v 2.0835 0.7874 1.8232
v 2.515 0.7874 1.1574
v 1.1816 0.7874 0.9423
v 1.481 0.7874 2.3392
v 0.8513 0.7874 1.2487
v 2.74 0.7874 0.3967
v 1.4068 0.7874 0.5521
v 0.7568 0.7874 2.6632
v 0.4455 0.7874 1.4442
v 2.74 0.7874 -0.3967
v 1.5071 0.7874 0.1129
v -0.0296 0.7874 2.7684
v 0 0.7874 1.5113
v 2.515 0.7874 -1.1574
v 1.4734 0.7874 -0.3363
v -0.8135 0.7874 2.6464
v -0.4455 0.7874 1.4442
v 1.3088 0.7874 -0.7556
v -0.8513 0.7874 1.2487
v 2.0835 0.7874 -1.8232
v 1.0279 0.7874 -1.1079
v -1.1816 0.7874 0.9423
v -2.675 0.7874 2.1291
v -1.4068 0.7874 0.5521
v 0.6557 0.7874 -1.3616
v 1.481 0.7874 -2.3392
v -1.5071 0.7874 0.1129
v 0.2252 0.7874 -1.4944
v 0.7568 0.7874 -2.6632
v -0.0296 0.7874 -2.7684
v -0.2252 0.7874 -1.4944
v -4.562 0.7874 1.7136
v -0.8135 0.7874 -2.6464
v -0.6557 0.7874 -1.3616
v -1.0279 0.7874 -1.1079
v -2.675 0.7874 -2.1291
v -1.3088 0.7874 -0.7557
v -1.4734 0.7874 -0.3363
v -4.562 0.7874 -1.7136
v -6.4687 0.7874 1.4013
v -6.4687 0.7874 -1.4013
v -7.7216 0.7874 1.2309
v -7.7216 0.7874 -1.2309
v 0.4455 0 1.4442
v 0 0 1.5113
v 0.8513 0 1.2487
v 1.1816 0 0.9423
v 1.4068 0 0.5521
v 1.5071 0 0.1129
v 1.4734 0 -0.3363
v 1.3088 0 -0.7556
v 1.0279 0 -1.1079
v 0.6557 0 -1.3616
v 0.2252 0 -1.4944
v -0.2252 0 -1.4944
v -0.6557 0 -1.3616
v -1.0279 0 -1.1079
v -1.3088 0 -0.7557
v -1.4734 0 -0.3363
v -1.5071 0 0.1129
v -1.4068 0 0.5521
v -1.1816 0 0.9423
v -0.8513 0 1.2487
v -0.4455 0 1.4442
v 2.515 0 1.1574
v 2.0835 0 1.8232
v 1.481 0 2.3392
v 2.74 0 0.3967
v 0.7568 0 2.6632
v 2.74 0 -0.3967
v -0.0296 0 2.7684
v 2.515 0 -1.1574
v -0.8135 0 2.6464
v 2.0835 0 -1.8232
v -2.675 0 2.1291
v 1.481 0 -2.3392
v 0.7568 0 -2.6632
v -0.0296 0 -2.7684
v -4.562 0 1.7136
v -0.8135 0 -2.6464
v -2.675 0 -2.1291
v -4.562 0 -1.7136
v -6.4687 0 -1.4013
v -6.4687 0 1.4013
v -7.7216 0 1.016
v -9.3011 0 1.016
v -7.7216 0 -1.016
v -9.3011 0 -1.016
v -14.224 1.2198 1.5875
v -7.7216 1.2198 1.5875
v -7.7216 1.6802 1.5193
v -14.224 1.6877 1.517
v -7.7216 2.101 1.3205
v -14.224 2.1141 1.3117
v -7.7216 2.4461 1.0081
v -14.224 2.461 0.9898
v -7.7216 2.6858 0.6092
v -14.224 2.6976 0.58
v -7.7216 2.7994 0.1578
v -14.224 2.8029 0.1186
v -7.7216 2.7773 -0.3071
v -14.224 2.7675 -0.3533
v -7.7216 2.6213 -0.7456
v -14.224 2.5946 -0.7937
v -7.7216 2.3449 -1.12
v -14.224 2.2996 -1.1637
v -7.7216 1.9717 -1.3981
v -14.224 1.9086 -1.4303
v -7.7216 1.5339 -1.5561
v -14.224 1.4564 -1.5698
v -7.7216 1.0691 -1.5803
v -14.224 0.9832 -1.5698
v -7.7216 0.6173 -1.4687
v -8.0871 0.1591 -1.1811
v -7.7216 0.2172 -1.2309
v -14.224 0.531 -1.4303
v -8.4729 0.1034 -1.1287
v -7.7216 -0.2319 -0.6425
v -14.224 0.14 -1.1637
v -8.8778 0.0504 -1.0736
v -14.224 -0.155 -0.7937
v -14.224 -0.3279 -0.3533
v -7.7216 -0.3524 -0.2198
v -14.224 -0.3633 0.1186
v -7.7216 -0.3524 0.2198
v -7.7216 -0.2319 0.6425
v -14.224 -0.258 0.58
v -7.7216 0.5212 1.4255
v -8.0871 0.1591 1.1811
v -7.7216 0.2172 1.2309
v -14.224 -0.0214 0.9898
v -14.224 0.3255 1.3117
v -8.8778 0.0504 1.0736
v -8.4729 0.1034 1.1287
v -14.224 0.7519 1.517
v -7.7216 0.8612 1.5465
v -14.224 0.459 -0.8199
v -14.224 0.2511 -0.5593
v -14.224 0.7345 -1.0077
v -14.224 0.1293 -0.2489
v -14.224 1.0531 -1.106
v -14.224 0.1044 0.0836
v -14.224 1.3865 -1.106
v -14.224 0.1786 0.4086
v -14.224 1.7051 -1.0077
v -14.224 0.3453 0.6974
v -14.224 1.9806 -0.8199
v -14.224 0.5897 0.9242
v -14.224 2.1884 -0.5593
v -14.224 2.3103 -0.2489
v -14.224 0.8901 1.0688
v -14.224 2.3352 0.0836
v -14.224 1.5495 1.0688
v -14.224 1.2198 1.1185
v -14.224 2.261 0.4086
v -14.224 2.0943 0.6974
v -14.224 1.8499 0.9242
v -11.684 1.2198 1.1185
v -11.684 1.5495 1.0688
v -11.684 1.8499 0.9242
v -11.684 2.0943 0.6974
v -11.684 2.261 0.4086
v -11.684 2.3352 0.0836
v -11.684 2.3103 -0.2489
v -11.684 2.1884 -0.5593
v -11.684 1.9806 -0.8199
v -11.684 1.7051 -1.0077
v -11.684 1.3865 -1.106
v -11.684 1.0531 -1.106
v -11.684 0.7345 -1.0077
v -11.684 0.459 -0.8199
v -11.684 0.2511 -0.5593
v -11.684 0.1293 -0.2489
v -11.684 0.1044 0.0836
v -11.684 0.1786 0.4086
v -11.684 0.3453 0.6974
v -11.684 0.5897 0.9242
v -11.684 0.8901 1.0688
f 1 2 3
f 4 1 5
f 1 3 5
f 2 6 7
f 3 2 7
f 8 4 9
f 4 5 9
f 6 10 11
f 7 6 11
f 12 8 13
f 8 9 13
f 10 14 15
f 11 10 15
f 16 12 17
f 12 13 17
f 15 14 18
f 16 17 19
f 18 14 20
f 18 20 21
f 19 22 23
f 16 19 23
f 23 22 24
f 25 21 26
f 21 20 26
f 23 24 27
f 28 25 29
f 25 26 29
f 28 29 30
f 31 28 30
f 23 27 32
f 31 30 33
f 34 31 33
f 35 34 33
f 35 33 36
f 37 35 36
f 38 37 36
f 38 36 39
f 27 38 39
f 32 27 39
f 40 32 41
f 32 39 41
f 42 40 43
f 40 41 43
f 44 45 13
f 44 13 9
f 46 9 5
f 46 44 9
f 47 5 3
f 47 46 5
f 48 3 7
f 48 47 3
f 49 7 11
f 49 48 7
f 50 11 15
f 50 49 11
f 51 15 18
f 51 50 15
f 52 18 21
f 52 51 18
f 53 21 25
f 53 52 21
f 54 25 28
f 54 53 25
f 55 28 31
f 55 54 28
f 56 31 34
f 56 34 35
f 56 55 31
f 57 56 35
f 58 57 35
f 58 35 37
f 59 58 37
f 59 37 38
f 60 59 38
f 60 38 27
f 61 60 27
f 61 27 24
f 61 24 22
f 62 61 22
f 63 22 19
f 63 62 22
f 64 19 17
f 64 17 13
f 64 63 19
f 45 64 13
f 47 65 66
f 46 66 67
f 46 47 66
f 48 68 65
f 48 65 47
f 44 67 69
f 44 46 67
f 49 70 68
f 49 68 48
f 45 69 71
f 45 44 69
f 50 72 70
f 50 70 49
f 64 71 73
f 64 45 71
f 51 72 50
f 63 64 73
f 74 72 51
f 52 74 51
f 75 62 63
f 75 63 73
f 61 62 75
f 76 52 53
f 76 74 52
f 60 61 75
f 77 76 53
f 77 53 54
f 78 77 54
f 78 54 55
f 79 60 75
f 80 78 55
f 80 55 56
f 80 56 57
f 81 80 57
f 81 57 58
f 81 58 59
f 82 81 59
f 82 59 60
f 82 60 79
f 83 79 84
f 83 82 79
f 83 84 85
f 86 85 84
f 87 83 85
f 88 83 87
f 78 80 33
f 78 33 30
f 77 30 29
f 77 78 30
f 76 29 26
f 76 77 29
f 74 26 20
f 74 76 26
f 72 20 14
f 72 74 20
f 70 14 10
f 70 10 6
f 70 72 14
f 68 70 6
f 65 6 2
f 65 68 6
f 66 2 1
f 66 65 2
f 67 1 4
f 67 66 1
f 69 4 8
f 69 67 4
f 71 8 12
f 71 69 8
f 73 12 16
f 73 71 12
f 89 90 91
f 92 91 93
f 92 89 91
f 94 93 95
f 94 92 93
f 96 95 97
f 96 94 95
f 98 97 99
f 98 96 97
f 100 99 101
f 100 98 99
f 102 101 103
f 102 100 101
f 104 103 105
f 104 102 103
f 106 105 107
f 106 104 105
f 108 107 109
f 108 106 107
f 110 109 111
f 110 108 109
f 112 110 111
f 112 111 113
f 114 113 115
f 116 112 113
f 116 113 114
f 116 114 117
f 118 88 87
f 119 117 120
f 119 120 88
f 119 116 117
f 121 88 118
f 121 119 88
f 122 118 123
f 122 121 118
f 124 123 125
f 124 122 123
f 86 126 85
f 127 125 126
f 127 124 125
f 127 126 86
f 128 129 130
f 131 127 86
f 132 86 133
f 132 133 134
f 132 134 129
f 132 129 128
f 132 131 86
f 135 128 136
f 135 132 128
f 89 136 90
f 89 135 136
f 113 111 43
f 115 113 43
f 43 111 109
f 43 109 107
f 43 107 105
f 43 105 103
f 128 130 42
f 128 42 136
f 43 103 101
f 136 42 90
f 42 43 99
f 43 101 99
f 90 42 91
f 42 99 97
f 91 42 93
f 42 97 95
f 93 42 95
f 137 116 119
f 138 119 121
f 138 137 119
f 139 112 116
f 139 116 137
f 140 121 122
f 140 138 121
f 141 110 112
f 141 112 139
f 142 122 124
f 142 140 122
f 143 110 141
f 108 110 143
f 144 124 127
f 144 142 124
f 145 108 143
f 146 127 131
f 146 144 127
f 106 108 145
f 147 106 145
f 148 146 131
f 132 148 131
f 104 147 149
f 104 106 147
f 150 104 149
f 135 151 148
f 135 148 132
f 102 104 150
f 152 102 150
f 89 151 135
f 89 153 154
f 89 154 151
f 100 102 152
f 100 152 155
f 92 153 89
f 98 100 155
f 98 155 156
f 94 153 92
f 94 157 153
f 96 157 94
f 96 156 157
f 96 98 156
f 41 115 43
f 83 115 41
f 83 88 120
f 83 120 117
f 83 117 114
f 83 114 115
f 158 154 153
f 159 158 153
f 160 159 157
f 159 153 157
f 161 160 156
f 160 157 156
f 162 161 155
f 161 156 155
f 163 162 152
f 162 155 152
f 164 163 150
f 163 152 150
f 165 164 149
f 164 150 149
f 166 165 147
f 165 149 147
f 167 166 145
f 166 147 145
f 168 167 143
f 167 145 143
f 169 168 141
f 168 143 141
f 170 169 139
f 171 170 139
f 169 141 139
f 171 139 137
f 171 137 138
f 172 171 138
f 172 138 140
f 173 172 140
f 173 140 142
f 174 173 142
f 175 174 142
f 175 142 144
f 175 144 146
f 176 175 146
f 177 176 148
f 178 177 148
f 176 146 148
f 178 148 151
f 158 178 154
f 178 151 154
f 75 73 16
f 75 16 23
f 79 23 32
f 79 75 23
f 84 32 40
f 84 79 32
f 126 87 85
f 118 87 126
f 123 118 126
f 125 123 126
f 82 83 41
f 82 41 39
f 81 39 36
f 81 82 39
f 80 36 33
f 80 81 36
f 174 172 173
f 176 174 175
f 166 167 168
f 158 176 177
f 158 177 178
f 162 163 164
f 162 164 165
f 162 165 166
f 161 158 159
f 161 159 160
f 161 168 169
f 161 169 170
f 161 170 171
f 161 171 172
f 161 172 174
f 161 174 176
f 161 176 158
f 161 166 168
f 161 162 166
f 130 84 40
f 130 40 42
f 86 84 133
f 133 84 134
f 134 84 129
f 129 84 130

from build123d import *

# Parameters (mm, degrees)
SKETCH1_R           = 1.5113
BOSS_EXTRUDE1_DEPTH = 0.7874
SKETCH2_R           = 1.5875
BOSS_EXTRUDE2_DEPTH = 6.5024
SKETCH3_R           = 1.11850285
CUT_EXTRUDE1_DEPTH  = 2.54


with BuildPart() as part:
    # Sketch1 → Boss-Extrude1 (new body)
    with BuildSketch(Plane(origin=(0, 0, 0), x_dir=(1, 0, 0), z_dir=(0, 1, 0))):
        with BuildLine():
            Line((-6.468656663, -1.40130078), (-9.301119213, -1.016))
            Line((-9.301119213, -1.016), (-14.224, -1.016))
            Line((-14.224, -1.016), (-14.224, 0))
            Line((-14.224, 0), (-14.224, 1.016))
            Line((-14.224, 1.016), (-9.301119213, 1.016))
            Line((-9.301119213, 1.016), (-6.468656663, 1.40130078))
            ThreePointArc((-6.468656663, 1.40130078), (-3.615678691, 1.908544578), (-0.813473119, 2.646395179))
            ThreePointArc((-0.813473119, 2.646395179), (2.7686, 0), (-0.813473119, -2.646395179))
            ThreePointArc((-0.813473119, -2.646395179), (-3.615678691, -1.908544578), (-6.468656663, -1.40130078))
        make_face()
        with Locations(Location((0, 0, 0), (0, 0, 270))):
            Circle(SKETCH1_R, mode=Mode.SUBTRACT)
    extrude(amount=BOSS_EXTRUDE1_DEPTH)

    # Sketch2 → Boss-Extrude2 (add)
    with BuildSketch(Plane.ZY.offset(14.224)):
        with Locations((0, 1.219795167)):
            Circle(SKETCH2_R)
    extrude(amount=-BOSS_EXTRUDE2_DEPTH)

    # Sketch3 → Cut-Extrude1 (cut)
    with BuildSketch(Plane.ZY.offset(14.224)):
        with Locations((0, 1.219795167)):
            Circle(SKETCH3_R)
    extrude(amount=-CUT_EXTRUDE1_DEPTH, mode=Mode.SUBTRACT)


solid = part.part
